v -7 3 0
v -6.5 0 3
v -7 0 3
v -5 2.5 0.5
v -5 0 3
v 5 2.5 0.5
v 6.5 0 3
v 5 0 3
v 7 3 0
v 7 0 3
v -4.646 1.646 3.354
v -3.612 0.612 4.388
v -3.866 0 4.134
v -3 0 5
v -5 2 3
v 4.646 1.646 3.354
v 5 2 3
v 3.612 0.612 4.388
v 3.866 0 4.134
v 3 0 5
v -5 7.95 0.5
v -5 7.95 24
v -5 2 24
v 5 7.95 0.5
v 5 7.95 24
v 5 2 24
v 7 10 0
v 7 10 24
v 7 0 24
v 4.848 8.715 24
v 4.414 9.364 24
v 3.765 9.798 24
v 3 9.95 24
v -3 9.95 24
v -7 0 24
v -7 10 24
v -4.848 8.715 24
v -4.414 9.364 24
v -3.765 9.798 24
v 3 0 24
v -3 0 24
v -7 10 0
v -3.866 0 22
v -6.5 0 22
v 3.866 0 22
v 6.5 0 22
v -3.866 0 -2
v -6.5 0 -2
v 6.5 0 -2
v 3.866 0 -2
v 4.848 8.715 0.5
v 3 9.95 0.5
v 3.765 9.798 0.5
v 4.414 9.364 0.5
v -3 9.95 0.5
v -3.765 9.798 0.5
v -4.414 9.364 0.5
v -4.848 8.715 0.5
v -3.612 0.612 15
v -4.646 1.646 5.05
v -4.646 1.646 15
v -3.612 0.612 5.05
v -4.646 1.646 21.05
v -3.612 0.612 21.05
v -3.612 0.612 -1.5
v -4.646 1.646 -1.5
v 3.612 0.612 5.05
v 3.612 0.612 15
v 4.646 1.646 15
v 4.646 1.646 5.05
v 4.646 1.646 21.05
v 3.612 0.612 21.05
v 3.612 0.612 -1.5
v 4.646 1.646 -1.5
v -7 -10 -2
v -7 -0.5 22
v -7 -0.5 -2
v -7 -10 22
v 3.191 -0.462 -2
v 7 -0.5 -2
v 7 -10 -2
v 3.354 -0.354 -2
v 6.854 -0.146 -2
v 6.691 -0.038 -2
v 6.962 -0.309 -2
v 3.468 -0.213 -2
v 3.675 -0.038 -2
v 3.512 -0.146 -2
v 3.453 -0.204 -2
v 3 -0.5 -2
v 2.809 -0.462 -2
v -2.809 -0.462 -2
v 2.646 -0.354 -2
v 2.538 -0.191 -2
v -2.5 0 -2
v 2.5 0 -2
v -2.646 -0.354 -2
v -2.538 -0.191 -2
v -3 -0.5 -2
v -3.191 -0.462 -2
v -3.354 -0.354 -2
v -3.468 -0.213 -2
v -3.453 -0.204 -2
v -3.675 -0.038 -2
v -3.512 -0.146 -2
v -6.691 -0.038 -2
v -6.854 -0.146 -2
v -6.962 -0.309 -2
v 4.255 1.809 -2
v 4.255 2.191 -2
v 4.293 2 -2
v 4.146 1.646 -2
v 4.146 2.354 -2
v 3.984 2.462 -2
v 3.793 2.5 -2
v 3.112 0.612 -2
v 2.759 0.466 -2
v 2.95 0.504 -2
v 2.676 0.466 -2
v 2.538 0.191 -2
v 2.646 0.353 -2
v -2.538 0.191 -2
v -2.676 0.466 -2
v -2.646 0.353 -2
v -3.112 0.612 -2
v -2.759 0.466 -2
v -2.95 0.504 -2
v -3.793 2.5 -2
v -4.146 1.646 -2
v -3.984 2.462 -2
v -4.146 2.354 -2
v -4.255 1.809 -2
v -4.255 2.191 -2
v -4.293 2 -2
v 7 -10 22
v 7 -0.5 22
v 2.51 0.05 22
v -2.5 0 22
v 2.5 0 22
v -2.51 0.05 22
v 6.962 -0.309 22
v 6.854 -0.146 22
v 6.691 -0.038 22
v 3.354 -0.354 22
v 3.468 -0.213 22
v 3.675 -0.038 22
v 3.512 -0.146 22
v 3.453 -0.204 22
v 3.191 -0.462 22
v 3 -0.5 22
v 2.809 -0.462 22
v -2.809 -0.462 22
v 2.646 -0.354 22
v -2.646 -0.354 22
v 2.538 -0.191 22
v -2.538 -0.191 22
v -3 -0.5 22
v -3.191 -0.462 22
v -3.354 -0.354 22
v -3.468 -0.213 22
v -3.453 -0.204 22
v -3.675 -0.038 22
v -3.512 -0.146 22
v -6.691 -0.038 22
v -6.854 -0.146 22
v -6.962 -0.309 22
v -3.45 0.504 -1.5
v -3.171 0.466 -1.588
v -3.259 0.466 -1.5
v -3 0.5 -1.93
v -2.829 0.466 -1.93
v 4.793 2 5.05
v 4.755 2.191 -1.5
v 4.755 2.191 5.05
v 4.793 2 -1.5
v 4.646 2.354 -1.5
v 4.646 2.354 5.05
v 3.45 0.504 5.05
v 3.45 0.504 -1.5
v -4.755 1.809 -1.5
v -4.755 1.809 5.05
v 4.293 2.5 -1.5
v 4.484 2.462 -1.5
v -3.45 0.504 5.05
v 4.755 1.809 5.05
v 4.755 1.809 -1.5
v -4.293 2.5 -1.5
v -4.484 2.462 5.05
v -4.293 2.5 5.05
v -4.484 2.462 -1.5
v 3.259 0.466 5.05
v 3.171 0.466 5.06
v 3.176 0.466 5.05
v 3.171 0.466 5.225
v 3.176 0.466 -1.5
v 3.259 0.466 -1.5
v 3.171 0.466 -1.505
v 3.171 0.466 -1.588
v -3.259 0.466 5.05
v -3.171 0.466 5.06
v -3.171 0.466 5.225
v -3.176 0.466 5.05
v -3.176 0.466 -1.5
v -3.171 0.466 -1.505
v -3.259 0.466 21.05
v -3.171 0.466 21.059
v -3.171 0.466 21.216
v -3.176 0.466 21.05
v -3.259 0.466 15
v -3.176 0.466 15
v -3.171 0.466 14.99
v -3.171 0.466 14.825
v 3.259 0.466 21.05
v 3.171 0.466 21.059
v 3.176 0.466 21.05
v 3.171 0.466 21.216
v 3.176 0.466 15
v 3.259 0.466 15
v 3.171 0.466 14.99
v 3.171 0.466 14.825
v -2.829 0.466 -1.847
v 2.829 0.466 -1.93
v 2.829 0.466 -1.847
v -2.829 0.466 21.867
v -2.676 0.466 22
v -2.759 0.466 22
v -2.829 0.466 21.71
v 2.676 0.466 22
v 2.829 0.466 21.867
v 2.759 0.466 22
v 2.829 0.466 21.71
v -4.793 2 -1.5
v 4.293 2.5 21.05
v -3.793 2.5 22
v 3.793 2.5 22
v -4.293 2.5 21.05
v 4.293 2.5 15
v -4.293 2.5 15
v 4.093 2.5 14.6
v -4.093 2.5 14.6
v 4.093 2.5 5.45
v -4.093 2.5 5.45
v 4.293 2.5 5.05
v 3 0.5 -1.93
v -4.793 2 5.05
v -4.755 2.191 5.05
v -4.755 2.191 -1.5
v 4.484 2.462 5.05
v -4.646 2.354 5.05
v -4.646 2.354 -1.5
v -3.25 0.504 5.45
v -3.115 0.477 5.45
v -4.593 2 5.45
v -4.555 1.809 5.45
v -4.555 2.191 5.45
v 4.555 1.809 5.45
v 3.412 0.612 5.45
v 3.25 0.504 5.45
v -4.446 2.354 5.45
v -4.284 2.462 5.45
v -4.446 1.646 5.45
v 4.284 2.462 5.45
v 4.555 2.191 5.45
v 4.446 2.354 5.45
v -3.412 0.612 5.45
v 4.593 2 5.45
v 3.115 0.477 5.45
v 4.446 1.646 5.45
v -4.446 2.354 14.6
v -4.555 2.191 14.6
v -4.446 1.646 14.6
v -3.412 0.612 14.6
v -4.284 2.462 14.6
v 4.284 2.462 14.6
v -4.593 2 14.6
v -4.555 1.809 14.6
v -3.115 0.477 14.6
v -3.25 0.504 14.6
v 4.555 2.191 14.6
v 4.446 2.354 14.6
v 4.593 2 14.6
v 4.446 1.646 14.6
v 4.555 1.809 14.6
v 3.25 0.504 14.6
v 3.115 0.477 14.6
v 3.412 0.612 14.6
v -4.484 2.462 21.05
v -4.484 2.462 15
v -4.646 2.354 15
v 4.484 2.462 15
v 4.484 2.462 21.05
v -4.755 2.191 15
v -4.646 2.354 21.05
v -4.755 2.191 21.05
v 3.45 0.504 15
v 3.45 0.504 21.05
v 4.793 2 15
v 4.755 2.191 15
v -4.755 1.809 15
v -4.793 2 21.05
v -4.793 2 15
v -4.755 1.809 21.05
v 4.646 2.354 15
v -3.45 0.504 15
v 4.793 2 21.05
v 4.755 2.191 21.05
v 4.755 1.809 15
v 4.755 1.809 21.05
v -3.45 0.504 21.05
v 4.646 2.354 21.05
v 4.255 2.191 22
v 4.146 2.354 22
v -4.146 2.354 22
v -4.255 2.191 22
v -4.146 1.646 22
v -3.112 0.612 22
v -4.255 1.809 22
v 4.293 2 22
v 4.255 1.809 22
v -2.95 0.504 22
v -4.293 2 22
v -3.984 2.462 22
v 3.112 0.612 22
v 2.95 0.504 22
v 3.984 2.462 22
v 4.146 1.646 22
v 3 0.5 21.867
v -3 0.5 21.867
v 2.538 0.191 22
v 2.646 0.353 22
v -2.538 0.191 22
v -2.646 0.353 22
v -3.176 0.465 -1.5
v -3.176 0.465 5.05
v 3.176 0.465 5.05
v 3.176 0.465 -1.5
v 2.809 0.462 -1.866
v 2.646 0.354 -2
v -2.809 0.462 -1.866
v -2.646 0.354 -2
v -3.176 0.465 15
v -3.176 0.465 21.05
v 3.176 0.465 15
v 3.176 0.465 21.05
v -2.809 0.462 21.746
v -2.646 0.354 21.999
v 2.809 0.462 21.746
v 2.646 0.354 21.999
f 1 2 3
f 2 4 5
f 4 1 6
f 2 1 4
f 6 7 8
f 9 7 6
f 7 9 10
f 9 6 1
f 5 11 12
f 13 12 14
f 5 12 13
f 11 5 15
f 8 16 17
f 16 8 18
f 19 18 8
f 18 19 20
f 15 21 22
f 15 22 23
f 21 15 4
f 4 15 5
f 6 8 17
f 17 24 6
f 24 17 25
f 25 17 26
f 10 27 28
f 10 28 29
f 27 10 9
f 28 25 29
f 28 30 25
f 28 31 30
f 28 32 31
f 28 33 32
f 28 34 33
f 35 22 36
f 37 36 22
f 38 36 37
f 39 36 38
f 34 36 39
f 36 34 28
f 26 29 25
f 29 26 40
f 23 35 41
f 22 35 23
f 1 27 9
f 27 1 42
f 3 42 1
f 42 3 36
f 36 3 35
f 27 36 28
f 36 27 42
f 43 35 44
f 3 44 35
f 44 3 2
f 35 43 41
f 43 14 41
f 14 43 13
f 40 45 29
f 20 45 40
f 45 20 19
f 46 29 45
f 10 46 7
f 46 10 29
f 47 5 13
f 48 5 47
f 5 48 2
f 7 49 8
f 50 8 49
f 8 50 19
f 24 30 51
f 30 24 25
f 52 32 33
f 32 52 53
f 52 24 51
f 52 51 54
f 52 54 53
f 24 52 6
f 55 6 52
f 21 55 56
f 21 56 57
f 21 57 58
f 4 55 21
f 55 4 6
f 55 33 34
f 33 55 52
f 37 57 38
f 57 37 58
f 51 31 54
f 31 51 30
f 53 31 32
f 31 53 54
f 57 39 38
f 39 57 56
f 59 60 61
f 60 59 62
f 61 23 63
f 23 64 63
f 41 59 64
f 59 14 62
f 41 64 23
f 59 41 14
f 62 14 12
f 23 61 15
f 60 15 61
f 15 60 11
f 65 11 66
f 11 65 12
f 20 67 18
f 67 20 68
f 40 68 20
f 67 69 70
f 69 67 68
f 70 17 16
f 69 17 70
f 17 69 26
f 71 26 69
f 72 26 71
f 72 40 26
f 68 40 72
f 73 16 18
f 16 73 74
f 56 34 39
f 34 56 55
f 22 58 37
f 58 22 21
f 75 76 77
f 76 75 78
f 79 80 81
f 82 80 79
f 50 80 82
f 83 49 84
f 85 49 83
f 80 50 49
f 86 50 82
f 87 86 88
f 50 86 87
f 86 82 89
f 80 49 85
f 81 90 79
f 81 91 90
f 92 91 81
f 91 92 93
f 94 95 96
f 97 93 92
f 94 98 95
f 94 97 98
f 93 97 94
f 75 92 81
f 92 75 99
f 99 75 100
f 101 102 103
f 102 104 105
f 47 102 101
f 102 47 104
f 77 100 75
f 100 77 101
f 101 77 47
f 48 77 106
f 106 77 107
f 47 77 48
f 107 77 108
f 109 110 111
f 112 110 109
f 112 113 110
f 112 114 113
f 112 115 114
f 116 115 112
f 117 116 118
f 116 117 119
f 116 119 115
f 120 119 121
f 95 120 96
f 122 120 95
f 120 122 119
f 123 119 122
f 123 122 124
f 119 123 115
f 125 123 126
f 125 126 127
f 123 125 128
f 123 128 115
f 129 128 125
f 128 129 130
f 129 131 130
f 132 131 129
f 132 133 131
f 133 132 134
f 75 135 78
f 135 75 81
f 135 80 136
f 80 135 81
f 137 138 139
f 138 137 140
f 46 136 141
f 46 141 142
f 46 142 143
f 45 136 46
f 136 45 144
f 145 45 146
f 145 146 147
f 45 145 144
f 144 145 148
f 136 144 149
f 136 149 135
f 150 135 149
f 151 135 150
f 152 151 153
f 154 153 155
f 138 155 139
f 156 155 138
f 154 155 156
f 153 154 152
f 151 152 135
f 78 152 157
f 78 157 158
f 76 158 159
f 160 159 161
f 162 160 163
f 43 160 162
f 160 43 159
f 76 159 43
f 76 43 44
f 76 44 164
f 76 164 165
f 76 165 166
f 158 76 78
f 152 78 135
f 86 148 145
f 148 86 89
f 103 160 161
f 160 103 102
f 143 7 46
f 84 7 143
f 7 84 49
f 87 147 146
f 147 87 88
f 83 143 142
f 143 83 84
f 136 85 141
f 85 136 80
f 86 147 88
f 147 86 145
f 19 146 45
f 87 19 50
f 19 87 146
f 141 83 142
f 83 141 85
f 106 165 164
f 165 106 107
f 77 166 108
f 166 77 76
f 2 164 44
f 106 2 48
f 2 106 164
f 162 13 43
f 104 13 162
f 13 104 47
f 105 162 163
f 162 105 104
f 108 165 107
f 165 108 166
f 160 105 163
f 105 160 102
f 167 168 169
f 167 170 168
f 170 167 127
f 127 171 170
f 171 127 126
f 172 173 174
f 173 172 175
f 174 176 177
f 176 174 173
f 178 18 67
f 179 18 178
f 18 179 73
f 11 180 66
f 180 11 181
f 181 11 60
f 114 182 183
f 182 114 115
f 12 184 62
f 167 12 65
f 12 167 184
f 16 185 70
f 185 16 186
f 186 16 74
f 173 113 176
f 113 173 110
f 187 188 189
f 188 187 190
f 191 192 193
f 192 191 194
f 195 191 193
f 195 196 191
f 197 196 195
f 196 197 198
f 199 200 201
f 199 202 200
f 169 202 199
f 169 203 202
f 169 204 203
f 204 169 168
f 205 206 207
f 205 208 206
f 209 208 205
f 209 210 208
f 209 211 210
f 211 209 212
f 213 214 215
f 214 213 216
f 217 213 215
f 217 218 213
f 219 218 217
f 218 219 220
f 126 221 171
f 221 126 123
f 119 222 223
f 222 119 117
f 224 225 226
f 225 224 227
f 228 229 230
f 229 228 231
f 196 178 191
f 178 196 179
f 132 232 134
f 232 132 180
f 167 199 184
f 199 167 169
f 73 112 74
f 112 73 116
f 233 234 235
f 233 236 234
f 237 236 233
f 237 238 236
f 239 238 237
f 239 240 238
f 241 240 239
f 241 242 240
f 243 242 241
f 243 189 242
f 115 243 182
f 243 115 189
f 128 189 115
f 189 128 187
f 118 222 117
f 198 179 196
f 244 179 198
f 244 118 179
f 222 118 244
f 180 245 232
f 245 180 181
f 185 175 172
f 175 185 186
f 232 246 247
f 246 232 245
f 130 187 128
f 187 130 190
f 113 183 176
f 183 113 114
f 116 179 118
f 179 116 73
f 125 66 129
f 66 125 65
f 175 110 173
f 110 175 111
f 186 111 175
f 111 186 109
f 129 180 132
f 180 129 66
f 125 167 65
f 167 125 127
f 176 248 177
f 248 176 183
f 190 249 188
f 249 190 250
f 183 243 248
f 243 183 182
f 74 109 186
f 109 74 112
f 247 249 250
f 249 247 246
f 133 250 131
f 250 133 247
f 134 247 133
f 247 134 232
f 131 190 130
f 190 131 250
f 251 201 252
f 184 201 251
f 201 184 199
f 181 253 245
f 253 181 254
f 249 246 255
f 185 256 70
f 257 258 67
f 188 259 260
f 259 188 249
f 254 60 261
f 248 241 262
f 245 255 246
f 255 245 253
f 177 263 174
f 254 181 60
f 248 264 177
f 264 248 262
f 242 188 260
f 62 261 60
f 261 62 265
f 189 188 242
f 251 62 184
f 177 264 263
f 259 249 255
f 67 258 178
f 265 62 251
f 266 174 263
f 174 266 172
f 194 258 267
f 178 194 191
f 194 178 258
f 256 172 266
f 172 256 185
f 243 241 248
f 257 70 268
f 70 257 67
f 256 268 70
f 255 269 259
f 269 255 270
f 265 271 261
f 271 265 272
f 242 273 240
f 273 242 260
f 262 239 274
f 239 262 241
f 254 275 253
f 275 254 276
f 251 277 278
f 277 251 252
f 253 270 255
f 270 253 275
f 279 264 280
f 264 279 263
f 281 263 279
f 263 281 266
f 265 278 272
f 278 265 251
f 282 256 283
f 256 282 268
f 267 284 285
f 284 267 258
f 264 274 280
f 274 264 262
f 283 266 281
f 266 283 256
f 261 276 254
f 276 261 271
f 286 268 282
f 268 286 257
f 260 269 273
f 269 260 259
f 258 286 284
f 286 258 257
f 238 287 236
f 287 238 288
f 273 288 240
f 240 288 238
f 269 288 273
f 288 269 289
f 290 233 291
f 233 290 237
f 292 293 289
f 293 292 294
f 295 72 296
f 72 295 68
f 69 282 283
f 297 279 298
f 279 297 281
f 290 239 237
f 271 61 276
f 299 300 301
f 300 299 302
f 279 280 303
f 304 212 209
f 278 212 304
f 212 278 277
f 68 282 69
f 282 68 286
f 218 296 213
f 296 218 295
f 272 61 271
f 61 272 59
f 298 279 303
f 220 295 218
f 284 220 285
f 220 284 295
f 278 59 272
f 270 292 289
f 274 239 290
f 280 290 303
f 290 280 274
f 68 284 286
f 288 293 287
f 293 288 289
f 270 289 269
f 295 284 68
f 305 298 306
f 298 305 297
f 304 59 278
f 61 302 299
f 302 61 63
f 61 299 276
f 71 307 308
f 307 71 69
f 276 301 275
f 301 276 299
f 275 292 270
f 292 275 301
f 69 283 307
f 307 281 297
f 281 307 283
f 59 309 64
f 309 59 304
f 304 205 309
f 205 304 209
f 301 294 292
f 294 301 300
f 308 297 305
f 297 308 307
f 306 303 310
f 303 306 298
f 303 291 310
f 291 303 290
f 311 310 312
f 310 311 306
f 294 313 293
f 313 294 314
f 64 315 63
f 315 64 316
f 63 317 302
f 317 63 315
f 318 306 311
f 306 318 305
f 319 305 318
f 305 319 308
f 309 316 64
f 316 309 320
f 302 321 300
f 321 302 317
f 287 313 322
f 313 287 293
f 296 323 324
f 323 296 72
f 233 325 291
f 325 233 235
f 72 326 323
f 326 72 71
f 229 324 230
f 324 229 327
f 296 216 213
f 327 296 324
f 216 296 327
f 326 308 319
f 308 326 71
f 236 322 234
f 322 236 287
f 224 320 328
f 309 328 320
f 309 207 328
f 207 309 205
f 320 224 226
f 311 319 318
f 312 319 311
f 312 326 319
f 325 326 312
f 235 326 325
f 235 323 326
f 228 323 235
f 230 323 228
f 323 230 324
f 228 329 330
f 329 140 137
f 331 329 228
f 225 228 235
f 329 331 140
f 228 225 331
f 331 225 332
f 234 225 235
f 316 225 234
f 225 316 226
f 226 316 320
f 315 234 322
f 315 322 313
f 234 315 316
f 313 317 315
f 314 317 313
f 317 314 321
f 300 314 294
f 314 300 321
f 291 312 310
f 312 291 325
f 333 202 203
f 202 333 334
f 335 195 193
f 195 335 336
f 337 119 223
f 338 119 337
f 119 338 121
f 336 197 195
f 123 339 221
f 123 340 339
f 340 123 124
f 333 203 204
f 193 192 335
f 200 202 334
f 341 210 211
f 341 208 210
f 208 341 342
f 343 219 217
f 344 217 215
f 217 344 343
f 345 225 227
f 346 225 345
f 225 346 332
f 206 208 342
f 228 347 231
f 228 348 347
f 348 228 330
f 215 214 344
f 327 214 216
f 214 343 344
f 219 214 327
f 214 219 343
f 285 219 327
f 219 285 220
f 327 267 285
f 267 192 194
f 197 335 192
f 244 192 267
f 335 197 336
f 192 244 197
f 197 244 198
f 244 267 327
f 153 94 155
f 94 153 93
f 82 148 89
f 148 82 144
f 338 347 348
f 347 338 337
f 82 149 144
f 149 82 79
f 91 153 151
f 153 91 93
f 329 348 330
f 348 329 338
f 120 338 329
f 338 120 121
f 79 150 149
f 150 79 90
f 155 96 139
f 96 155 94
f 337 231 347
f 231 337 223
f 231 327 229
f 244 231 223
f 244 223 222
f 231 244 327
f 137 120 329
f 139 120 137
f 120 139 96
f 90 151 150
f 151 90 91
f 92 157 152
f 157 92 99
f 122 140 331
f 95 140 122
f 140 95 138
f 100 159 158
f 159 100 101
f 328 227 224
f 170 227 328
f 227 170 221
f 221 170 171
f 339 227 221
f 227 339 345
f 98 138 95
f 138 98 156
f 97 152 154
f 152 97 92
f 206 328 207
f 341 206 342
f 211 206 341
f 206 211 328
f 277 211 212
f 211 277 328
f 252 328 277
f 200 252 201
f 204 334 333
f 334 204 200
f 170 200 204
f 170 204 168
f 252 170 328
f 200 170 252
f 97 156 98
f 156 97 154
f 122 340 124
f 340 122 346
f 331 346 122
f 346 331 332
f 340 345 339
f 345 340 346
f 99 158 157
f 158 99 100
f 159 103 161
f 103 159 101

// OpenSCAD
/******************************************************************
*                                                                 *
* OpenFlexure Microscope: Illumination arm                        *
*                                                                 *
* This is part of the OpenFlexure microscope, an open-source      *
* microscope and 3-axis translation stage.  It gets really good   *
* precision over a ~10mm range, by using plastic flexure          *
* mechanisms.                                                     *
*                                                                 *
* This file deals with the dovetail clips that are used to hold   *
* the objective and illumination, and provide coarse Z adjustment.*
*                                                                 *
* (c) Richard Bowman, January 2016                                *
* Released under the CERN Open Hardware License                   *
*                                                                 *
******************************************************************/

use <utilities.scad>;
$fn=16;
d=0.05;

module dovetail_clip_cutout(size,dt=1.5,t=2){
    // This will form a female dovetail when subtracted from a block.
    // cut this out of a cube (of size "size", with one edge centred along
    // the X axis extending into +y, +z
    // dt sets the size of the 45-degree clips
    // t sets the thickness of the dovetail arms (2mm is good)
    // I reccommend using ~8-10mm arms for a tight fit.  On all my
    // printers, the ooze of the plastic is enough to keep it tight, so I
    // set the size of the M and F dovetails to be identical.  You might
    // want to make it tighter, either by increasing dt slightly or by
    // decreasing the size slightly (in both cases, of this, the female
    // dovetail).
    // NB that it starts at z=-d and stops at z=size[2]+d to make
    // it easy to subtract from a block.
	hull() reflect([1,0,0]) translate([-size[0]/2+t,0,-d]){
		translate([dt,size[1]-dt,0]) cylinder(r=dt,h=size[2]+2*d,$fn=16);
		translate([0,dt,0]) rotate(-45) cube([dt*2,d,size[2]+2*d]);
	}
}
module dovetail_clip(size=[10,2,10],dt=1.5,t=2,back_t=0,slope_front=0,solid_bottom=0){
    // This forms a clip that will grip a dovetail, with the
    // contact between the m/f parts in the y=0 plane.
    // This is the female part, and it is centred in X and 
    // extends into +y, +z.
    // The outer dimensions of the clip are given by size.
    // dt sets the size of the clip's teeth, and t is the
    // thickness of the arms.  By default it has no back, and
    // should be attached to a solid surface.  Specifying back_t>0
    // will add material at the back (by shortening the arms).
    // slope_front will add a sloped section to the front of the arms.
    // this can improve the quality of the bottom of the dovetail 
    // (good if you're inserting from the bottom)
    // solid_bottom will join the arms together at the bottom, which
    // can help with bed adhesion.
    inner_w=size[0]-2*t;
    solid_bottom = solid_bottom > 0 ? solid_bottom+d : 0;
	difference(){
		translate([-size[0]/2,0,0]) cube(size);
		translate([0,0,solid_bottom]) //allow for thin bottom to enhance adhesion
            dovetail_clip_cutout(size-[0,back_t+d,0],dt=dt,t=t,h=999);
        if(slope_front>0){
            //sloped bottom to improve quality of the dovetail clip and
            //allow insertion of the male dovetail from the bottom
            rotate([45,0,0]) cube([999,1,1]*sqrt(2)*slope_front,center=true); //slope up arms
            hull() reflect([0,0,1]) translate([0,0,slope_front]) rotate([0,45,0]) cube([(inner_w)/sqrt(2),dt*2,inner_w/sqrt(2)],center=true);
        }
	}
}

module dovetail_plug(corner_x, r, dt, zx_profile=[[0,0],[10,0],[12,-1]]){
    // Just the "plug" of a male dovetail (i.e. not the flat surface
    // it's attached to, just the bit that fits inside the female).
    // zx_profile is a list of 2-element vectors, each of which defines
    //   a point in Z-X space, i.e. first element is height and second
    //   is the shift in the corner position.  For example,
    //   zx_profile=[[0,0],[10,0],[12,-1]] creates a plug 12mm+d high 
    //   where the top 2mm are sloped at 60 degrees.  NB the use of d.
    union(){
        // sorry for the copy-paste code; I'm fairly sure it's less readable
        // if I arrange things in a way that avoids it...
        // four fat cylinders make the contact point
        for(i=[0:len(zx_profile)-2]){
            hull() for(j=[0:1]){
                z = zx_profile[i+j][0];
                x = zx_profile[i+j][1];
                reflect([1,0,0]) translate([corner_x+x,0,z]) rotate(45) translate([sqrt(3)*r,r,0]) repeat([dt*sqrt(2) - (1+sqrt(3))*r,0,0],2) cylinder(r=r,h=d);
            }
        }
        // another four cylinders join the plug to the y=0 plane
        for(i=[0:len(zx_profile)-2]){
            hull() for(j=[0:1]){
                z = zx_profile[i+j][0];
                x = zx_profile[i+j][1];
                reflect([1,0,0]) translate([corner_x+x,0,z]) rotate(45) repeat([sqrt(3)*r,r,0],2) cylinder(r=d,h=d);
            }
        }
    }
}
module dovetail_m(size=[10,2,10],dt=1.5,t=2,top_taper=1,bottom_taper=0.5,waist=0,waist_dx=0.5){
    // Male dovetail, contact plane is y=0, dovetail is in y>0
    // size is a box that is centred in X, sits on Z=0, and extends
    // in the -y direction from y=0.  This is the mount for the
    // dovetail, which sits in the +y direction.
    // The width of the box should be the same as the width of the
    // female dovetail clip.  The size of the dovetail is set by dt.
    // t sets the thickness of the female dovetail arms; the dovetail
    // is actually size[0]-2*t wide.
    r=0.5; //radius of curvature - something around nozzle width is good.
    w=size[0]-2*t; //width of dovetail
    h=size[2]; //height
    corner=[w/2-dt,0,0]; //location of the pointy bit of the dovetail
    difference(){
		union(){
            //back of the dovetail (the mount) plus the start of the
            //dovetail's neck (as far as y=0)
			sequential_hull(){
                // start with the cube that the dovetail attaches to
				translate([-w/2-t,-size[1],0]) cube([w+2*t,size[1]-r,h]);
                // then add shapes that take in the centres of the cylinders
                // from the next step.  This joins together the nicely-rounded
                // contact points, such that when we subtract out the cylinders
                // at the corners we get a nice smooth shape.
                reflect([1,0,0]) translate(corner+[sqrt(3)*r,-r,0]) cylinder(r=d,h=h);
                reflect([1,0,0]) translate(corner) cylinder(r=d,h=h);
			}
            //contact points (with rounded edges to avoid burrs)
			difference(){
				union(){
					reflect([1,0,0]) hull(){
						translate(corner+[sqrt(3)*r,-r,0]) cylinder(r=r,h=h);	
						translate([w/2+t-r,-r,0]) cylinder(r=r,h=h);	
                    }
					//hull() reflect([1,0,0]) translate(corner) rotate(45) translate([sqrt(3)*r,r,0]) repeat([1,0,0],2) cylinder(r=r,h=h);
                    // the "plug" is tapered for easy insertion, and may
                    // have optional indents in the middle (a "waist").
                    waist_dx = waist>waist_dx*4 ? waist_dx : 0;
                    waist_dz = waist>waist_dx*4 ? waist_dx*2 : d;
                    zx_profile = [[0,-bottom_taper],
                                  [bottom_taper,0],
                                  [h/2-waist/2,0],
                                  [h/2-waist/2+waist_dz,-waist_dx],
                                  [h/2+waist/2-waist_dz,-waist_dx],
                                  [h/2+waist/2,0],
                                  [h-top_taper,0],
                                  [h-d,-top_taper/2]];
                    dovetail_plug(corner[0], r, dt, zx_profile);
                        
				}
			}
		}
        // We round out the internal corner so that we grip with the edges
        // of the tooth and not the point (you get better contact this way).
		reflect([1,0,0]) translate(corner) cylinder(r=r,h=3*h,center=true);
	}
}

test_size = [14,10,24];
test_dt = 2;
color("blue") dovetail_clip(test_size,dt=test_dt,slope_front=3,solid_bottom=0.5);
color("green") translate([0,0,-2]) dovetail_m(test_size, waist=10, dt=test_dt,waist_dx=0.2);
